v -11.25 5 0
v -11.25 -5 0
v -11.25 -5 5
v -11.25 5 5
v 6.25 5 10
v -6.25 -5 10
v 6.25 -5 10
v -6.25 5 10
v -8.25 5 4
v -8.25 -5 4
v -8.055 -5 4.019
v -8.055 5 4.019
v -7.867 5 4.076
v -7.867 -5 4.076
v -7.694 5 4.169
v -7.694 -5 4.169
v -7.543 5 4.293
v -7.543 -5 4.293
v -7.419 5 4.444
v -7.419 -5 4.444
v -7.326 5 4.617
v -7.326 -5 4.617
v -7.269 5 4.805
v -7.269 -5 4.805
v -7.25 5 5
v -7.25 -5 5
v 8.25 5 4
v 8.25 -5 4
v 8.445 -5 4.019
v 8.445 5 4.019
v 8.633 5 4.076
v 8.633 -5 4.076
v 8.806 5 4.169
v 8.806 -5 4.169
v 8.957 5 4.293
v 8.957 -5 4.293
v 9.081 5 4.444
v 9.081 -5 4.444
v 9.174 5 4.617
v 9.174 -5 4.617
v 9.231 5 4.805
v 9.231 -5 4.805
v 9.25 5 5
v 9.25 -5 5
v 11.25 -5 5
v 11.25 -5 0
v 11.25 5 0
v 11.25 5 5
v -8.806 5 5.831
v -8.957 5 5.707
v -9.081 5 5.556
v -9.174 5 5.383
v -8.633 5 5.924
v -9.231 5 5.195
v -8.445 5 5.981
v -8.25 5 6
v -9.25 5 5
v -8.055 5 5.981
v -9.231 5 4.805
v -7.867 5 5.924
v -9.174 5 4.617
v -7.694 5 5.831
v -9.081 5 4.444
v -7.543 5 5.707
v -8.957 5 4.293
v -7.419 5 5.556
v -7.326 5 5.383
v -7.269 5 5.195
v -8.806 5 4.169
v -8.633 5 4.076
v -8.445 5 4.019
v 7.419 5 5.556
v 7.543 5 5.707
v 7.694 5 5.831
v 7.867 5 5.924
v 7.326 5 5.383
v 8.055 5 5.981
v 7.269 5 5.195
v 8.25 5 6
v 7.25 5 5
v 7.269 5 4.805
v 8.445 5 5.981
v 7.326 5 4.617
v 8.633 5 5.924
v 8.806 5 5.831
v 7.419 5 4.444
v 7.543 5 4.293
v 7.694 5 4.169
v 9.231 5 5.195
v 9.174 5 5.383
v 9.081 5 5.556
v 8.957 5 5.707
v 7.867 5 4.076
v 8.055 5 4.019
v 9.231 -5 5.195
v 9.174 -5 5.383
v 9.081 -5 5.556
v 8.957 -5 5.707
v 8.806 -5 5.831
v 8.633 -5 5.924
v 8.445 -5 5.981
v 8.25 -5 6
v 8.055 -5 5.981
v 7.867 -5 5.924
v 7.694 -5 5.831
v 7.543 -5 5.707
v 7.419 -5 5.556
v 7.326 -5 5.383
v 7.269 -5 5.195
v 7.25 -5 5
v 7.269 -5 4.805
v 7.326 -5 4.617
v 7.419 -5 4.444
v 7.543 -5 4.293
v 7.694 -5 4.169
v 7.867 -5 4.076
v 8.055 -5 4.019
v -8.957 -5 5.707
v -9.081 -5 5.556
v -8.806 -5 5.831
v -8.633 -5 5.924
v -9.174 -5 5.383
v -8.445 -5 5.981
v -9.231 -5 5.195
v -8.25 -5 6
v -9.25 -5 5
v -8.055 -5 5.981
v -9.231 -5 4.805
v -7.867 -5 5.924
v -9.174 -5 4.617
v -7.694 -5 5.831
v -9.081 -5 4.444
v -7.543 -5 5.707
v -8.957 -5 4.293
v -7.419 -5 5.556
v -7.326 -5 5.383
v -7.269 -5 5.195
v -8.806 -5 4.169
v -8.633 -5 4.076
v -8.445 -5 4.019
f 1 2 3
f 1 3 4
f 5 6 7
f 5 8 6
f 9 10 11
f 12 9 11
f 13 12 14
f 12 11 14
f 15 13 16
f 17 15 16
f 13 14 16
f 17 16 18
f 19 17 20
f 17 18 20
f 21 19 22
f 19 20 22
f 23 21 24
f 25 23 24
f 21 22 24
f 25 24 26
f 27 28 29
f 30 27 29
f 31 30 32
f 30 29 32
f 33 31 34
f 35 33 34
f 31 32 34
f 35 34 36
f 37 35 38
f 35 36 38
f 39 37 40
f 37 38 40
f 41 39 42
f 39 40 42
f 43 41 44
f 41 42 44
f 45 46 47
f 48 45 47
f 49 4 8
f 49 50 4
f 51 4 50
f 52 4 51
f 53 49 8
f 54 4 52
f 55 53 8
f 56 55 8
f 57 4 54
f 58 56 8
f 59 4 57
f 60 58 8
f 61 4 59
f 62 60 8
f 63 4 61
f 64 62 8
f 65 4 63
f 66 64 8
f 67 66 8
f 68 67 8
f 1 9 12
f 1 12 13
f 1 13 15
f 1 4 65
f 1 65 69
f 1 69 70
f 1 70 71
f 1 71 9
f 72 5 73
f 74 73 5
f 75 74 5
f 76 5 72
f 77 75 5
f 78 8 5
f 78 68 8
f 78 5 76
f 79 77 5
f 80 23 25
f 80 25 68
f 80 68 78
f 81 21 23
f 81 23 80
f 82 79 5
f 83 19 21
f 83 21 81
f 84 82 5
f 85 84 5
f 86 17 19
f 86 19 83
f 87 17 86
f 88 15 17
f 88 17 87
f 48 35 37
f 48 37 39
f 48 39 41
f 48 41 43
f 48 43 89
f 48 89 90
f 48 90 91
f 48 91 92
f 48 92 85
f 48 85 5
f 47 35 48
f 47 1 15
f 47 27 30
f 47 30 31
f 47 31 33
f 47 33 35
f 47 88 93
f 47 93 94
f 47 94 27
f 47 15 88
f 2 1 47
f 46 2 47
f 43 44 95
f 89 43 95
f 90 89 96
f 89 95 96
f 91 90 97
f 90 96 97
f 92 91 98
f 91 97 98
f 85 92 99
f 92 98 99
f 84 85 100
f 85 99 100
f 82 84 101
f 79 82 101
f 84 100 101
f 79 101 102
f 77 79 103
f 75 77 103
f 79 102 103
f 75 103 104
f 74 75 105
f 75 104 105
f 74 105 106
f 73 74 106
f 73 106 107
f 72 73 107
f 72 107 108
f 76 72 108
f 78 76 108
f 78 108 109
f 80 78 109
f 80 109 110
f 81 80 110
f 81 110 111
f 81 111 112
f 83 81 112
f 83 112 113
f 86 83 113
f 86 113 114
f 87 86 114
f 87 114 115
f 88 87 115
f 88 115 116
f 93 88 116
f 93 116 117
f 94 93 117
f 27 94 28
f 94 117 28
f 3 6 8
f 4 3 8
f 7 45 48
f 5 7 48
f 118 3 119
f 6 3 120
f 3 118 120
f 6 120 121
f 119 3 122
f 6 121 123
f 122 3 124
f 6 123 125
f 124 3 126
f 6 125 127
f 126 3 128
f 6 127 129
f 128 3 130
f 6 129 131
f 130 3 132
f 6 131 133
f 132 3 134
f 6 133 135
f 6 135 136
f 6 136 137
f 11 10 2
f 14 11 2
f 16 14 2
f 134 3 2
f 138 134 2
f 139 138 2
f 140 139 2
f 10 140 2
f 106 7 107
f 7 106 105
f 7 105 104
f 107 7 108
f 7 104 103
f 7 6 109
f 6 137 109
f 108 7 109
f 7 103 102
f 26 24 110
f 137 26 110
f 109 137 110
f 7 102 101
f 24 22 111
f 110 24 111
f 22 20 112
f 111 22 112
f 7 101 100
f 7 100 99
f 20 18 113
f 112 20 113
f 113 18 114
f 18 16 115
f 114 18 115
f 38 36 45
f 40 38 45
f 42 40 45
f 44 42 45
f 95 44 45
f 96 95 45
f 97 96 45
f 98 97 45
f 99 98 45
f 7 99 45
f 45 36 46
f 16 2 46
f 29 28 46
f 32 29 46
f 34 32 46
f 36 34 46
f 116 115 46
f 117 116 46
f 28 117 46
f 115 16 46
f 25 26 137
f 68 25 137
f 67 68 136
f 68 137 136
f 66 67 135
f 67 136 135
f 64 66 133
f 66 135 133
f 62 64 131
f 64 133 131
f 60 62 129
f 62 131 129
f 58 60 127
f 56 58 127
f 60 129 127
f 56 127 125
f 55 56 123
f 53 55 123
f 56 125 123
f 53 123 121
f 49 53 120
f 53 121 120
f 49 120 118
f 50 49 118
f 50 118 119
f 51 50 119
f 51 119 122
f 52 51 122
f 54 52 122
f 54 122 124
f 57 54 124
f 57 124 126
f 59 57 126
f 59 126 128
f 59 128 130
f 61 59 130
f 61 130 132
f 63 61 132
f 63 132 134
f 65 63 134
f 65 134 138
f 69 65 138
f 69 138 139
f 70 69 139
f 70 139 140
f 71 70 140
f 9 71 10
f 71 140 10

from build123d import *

# Parameters (mm, degrees)
F0_W     = 22.5
F0_H     = 10
F1_DEPTH = 10
F3_DEPTH = 25
F4_SIZE  = 5


with BuildPart() as f1:
    # F0 (on Top) → F1 (new body)
    with BuildSketch(Plane.XY):
        Rectangle(F0_W, F0_H)
    extrude(amount=F1_DEPTH)

    # F2 (on face) → F3 (cut)
    with BuildSketch(Plane.XZ.offset(5)):
        with BuildLine():
            ThreePointArc((-7.25, 5), (-8.957107, 5.707107), (-8.25, 4))
            ThreePointArc((-8.25, 4), (-7.542893, 4.292893), (-7.25, 5))
        make_face()
        with BuildLine():
            ThreePointArc((9.25, 5), (7.542893, 5.707107), (8.25, 4))
            ThreePointArc((8.25, 4), (8.957107, 4.292893), (9.25, 5))
        make_face()
    extrude(amount=-F3_DEPTH, mode=Mode.SUBTRACT)

    # F4
    f4_edges = [f1.edges().sort_by_distance(p)[0] for p in [
        (-11.25, 0, 10),
        (11.25, 0, 10),
    ]]
    chamfer(f4_edges, length=F4_SIZE)


solid = f1.part
